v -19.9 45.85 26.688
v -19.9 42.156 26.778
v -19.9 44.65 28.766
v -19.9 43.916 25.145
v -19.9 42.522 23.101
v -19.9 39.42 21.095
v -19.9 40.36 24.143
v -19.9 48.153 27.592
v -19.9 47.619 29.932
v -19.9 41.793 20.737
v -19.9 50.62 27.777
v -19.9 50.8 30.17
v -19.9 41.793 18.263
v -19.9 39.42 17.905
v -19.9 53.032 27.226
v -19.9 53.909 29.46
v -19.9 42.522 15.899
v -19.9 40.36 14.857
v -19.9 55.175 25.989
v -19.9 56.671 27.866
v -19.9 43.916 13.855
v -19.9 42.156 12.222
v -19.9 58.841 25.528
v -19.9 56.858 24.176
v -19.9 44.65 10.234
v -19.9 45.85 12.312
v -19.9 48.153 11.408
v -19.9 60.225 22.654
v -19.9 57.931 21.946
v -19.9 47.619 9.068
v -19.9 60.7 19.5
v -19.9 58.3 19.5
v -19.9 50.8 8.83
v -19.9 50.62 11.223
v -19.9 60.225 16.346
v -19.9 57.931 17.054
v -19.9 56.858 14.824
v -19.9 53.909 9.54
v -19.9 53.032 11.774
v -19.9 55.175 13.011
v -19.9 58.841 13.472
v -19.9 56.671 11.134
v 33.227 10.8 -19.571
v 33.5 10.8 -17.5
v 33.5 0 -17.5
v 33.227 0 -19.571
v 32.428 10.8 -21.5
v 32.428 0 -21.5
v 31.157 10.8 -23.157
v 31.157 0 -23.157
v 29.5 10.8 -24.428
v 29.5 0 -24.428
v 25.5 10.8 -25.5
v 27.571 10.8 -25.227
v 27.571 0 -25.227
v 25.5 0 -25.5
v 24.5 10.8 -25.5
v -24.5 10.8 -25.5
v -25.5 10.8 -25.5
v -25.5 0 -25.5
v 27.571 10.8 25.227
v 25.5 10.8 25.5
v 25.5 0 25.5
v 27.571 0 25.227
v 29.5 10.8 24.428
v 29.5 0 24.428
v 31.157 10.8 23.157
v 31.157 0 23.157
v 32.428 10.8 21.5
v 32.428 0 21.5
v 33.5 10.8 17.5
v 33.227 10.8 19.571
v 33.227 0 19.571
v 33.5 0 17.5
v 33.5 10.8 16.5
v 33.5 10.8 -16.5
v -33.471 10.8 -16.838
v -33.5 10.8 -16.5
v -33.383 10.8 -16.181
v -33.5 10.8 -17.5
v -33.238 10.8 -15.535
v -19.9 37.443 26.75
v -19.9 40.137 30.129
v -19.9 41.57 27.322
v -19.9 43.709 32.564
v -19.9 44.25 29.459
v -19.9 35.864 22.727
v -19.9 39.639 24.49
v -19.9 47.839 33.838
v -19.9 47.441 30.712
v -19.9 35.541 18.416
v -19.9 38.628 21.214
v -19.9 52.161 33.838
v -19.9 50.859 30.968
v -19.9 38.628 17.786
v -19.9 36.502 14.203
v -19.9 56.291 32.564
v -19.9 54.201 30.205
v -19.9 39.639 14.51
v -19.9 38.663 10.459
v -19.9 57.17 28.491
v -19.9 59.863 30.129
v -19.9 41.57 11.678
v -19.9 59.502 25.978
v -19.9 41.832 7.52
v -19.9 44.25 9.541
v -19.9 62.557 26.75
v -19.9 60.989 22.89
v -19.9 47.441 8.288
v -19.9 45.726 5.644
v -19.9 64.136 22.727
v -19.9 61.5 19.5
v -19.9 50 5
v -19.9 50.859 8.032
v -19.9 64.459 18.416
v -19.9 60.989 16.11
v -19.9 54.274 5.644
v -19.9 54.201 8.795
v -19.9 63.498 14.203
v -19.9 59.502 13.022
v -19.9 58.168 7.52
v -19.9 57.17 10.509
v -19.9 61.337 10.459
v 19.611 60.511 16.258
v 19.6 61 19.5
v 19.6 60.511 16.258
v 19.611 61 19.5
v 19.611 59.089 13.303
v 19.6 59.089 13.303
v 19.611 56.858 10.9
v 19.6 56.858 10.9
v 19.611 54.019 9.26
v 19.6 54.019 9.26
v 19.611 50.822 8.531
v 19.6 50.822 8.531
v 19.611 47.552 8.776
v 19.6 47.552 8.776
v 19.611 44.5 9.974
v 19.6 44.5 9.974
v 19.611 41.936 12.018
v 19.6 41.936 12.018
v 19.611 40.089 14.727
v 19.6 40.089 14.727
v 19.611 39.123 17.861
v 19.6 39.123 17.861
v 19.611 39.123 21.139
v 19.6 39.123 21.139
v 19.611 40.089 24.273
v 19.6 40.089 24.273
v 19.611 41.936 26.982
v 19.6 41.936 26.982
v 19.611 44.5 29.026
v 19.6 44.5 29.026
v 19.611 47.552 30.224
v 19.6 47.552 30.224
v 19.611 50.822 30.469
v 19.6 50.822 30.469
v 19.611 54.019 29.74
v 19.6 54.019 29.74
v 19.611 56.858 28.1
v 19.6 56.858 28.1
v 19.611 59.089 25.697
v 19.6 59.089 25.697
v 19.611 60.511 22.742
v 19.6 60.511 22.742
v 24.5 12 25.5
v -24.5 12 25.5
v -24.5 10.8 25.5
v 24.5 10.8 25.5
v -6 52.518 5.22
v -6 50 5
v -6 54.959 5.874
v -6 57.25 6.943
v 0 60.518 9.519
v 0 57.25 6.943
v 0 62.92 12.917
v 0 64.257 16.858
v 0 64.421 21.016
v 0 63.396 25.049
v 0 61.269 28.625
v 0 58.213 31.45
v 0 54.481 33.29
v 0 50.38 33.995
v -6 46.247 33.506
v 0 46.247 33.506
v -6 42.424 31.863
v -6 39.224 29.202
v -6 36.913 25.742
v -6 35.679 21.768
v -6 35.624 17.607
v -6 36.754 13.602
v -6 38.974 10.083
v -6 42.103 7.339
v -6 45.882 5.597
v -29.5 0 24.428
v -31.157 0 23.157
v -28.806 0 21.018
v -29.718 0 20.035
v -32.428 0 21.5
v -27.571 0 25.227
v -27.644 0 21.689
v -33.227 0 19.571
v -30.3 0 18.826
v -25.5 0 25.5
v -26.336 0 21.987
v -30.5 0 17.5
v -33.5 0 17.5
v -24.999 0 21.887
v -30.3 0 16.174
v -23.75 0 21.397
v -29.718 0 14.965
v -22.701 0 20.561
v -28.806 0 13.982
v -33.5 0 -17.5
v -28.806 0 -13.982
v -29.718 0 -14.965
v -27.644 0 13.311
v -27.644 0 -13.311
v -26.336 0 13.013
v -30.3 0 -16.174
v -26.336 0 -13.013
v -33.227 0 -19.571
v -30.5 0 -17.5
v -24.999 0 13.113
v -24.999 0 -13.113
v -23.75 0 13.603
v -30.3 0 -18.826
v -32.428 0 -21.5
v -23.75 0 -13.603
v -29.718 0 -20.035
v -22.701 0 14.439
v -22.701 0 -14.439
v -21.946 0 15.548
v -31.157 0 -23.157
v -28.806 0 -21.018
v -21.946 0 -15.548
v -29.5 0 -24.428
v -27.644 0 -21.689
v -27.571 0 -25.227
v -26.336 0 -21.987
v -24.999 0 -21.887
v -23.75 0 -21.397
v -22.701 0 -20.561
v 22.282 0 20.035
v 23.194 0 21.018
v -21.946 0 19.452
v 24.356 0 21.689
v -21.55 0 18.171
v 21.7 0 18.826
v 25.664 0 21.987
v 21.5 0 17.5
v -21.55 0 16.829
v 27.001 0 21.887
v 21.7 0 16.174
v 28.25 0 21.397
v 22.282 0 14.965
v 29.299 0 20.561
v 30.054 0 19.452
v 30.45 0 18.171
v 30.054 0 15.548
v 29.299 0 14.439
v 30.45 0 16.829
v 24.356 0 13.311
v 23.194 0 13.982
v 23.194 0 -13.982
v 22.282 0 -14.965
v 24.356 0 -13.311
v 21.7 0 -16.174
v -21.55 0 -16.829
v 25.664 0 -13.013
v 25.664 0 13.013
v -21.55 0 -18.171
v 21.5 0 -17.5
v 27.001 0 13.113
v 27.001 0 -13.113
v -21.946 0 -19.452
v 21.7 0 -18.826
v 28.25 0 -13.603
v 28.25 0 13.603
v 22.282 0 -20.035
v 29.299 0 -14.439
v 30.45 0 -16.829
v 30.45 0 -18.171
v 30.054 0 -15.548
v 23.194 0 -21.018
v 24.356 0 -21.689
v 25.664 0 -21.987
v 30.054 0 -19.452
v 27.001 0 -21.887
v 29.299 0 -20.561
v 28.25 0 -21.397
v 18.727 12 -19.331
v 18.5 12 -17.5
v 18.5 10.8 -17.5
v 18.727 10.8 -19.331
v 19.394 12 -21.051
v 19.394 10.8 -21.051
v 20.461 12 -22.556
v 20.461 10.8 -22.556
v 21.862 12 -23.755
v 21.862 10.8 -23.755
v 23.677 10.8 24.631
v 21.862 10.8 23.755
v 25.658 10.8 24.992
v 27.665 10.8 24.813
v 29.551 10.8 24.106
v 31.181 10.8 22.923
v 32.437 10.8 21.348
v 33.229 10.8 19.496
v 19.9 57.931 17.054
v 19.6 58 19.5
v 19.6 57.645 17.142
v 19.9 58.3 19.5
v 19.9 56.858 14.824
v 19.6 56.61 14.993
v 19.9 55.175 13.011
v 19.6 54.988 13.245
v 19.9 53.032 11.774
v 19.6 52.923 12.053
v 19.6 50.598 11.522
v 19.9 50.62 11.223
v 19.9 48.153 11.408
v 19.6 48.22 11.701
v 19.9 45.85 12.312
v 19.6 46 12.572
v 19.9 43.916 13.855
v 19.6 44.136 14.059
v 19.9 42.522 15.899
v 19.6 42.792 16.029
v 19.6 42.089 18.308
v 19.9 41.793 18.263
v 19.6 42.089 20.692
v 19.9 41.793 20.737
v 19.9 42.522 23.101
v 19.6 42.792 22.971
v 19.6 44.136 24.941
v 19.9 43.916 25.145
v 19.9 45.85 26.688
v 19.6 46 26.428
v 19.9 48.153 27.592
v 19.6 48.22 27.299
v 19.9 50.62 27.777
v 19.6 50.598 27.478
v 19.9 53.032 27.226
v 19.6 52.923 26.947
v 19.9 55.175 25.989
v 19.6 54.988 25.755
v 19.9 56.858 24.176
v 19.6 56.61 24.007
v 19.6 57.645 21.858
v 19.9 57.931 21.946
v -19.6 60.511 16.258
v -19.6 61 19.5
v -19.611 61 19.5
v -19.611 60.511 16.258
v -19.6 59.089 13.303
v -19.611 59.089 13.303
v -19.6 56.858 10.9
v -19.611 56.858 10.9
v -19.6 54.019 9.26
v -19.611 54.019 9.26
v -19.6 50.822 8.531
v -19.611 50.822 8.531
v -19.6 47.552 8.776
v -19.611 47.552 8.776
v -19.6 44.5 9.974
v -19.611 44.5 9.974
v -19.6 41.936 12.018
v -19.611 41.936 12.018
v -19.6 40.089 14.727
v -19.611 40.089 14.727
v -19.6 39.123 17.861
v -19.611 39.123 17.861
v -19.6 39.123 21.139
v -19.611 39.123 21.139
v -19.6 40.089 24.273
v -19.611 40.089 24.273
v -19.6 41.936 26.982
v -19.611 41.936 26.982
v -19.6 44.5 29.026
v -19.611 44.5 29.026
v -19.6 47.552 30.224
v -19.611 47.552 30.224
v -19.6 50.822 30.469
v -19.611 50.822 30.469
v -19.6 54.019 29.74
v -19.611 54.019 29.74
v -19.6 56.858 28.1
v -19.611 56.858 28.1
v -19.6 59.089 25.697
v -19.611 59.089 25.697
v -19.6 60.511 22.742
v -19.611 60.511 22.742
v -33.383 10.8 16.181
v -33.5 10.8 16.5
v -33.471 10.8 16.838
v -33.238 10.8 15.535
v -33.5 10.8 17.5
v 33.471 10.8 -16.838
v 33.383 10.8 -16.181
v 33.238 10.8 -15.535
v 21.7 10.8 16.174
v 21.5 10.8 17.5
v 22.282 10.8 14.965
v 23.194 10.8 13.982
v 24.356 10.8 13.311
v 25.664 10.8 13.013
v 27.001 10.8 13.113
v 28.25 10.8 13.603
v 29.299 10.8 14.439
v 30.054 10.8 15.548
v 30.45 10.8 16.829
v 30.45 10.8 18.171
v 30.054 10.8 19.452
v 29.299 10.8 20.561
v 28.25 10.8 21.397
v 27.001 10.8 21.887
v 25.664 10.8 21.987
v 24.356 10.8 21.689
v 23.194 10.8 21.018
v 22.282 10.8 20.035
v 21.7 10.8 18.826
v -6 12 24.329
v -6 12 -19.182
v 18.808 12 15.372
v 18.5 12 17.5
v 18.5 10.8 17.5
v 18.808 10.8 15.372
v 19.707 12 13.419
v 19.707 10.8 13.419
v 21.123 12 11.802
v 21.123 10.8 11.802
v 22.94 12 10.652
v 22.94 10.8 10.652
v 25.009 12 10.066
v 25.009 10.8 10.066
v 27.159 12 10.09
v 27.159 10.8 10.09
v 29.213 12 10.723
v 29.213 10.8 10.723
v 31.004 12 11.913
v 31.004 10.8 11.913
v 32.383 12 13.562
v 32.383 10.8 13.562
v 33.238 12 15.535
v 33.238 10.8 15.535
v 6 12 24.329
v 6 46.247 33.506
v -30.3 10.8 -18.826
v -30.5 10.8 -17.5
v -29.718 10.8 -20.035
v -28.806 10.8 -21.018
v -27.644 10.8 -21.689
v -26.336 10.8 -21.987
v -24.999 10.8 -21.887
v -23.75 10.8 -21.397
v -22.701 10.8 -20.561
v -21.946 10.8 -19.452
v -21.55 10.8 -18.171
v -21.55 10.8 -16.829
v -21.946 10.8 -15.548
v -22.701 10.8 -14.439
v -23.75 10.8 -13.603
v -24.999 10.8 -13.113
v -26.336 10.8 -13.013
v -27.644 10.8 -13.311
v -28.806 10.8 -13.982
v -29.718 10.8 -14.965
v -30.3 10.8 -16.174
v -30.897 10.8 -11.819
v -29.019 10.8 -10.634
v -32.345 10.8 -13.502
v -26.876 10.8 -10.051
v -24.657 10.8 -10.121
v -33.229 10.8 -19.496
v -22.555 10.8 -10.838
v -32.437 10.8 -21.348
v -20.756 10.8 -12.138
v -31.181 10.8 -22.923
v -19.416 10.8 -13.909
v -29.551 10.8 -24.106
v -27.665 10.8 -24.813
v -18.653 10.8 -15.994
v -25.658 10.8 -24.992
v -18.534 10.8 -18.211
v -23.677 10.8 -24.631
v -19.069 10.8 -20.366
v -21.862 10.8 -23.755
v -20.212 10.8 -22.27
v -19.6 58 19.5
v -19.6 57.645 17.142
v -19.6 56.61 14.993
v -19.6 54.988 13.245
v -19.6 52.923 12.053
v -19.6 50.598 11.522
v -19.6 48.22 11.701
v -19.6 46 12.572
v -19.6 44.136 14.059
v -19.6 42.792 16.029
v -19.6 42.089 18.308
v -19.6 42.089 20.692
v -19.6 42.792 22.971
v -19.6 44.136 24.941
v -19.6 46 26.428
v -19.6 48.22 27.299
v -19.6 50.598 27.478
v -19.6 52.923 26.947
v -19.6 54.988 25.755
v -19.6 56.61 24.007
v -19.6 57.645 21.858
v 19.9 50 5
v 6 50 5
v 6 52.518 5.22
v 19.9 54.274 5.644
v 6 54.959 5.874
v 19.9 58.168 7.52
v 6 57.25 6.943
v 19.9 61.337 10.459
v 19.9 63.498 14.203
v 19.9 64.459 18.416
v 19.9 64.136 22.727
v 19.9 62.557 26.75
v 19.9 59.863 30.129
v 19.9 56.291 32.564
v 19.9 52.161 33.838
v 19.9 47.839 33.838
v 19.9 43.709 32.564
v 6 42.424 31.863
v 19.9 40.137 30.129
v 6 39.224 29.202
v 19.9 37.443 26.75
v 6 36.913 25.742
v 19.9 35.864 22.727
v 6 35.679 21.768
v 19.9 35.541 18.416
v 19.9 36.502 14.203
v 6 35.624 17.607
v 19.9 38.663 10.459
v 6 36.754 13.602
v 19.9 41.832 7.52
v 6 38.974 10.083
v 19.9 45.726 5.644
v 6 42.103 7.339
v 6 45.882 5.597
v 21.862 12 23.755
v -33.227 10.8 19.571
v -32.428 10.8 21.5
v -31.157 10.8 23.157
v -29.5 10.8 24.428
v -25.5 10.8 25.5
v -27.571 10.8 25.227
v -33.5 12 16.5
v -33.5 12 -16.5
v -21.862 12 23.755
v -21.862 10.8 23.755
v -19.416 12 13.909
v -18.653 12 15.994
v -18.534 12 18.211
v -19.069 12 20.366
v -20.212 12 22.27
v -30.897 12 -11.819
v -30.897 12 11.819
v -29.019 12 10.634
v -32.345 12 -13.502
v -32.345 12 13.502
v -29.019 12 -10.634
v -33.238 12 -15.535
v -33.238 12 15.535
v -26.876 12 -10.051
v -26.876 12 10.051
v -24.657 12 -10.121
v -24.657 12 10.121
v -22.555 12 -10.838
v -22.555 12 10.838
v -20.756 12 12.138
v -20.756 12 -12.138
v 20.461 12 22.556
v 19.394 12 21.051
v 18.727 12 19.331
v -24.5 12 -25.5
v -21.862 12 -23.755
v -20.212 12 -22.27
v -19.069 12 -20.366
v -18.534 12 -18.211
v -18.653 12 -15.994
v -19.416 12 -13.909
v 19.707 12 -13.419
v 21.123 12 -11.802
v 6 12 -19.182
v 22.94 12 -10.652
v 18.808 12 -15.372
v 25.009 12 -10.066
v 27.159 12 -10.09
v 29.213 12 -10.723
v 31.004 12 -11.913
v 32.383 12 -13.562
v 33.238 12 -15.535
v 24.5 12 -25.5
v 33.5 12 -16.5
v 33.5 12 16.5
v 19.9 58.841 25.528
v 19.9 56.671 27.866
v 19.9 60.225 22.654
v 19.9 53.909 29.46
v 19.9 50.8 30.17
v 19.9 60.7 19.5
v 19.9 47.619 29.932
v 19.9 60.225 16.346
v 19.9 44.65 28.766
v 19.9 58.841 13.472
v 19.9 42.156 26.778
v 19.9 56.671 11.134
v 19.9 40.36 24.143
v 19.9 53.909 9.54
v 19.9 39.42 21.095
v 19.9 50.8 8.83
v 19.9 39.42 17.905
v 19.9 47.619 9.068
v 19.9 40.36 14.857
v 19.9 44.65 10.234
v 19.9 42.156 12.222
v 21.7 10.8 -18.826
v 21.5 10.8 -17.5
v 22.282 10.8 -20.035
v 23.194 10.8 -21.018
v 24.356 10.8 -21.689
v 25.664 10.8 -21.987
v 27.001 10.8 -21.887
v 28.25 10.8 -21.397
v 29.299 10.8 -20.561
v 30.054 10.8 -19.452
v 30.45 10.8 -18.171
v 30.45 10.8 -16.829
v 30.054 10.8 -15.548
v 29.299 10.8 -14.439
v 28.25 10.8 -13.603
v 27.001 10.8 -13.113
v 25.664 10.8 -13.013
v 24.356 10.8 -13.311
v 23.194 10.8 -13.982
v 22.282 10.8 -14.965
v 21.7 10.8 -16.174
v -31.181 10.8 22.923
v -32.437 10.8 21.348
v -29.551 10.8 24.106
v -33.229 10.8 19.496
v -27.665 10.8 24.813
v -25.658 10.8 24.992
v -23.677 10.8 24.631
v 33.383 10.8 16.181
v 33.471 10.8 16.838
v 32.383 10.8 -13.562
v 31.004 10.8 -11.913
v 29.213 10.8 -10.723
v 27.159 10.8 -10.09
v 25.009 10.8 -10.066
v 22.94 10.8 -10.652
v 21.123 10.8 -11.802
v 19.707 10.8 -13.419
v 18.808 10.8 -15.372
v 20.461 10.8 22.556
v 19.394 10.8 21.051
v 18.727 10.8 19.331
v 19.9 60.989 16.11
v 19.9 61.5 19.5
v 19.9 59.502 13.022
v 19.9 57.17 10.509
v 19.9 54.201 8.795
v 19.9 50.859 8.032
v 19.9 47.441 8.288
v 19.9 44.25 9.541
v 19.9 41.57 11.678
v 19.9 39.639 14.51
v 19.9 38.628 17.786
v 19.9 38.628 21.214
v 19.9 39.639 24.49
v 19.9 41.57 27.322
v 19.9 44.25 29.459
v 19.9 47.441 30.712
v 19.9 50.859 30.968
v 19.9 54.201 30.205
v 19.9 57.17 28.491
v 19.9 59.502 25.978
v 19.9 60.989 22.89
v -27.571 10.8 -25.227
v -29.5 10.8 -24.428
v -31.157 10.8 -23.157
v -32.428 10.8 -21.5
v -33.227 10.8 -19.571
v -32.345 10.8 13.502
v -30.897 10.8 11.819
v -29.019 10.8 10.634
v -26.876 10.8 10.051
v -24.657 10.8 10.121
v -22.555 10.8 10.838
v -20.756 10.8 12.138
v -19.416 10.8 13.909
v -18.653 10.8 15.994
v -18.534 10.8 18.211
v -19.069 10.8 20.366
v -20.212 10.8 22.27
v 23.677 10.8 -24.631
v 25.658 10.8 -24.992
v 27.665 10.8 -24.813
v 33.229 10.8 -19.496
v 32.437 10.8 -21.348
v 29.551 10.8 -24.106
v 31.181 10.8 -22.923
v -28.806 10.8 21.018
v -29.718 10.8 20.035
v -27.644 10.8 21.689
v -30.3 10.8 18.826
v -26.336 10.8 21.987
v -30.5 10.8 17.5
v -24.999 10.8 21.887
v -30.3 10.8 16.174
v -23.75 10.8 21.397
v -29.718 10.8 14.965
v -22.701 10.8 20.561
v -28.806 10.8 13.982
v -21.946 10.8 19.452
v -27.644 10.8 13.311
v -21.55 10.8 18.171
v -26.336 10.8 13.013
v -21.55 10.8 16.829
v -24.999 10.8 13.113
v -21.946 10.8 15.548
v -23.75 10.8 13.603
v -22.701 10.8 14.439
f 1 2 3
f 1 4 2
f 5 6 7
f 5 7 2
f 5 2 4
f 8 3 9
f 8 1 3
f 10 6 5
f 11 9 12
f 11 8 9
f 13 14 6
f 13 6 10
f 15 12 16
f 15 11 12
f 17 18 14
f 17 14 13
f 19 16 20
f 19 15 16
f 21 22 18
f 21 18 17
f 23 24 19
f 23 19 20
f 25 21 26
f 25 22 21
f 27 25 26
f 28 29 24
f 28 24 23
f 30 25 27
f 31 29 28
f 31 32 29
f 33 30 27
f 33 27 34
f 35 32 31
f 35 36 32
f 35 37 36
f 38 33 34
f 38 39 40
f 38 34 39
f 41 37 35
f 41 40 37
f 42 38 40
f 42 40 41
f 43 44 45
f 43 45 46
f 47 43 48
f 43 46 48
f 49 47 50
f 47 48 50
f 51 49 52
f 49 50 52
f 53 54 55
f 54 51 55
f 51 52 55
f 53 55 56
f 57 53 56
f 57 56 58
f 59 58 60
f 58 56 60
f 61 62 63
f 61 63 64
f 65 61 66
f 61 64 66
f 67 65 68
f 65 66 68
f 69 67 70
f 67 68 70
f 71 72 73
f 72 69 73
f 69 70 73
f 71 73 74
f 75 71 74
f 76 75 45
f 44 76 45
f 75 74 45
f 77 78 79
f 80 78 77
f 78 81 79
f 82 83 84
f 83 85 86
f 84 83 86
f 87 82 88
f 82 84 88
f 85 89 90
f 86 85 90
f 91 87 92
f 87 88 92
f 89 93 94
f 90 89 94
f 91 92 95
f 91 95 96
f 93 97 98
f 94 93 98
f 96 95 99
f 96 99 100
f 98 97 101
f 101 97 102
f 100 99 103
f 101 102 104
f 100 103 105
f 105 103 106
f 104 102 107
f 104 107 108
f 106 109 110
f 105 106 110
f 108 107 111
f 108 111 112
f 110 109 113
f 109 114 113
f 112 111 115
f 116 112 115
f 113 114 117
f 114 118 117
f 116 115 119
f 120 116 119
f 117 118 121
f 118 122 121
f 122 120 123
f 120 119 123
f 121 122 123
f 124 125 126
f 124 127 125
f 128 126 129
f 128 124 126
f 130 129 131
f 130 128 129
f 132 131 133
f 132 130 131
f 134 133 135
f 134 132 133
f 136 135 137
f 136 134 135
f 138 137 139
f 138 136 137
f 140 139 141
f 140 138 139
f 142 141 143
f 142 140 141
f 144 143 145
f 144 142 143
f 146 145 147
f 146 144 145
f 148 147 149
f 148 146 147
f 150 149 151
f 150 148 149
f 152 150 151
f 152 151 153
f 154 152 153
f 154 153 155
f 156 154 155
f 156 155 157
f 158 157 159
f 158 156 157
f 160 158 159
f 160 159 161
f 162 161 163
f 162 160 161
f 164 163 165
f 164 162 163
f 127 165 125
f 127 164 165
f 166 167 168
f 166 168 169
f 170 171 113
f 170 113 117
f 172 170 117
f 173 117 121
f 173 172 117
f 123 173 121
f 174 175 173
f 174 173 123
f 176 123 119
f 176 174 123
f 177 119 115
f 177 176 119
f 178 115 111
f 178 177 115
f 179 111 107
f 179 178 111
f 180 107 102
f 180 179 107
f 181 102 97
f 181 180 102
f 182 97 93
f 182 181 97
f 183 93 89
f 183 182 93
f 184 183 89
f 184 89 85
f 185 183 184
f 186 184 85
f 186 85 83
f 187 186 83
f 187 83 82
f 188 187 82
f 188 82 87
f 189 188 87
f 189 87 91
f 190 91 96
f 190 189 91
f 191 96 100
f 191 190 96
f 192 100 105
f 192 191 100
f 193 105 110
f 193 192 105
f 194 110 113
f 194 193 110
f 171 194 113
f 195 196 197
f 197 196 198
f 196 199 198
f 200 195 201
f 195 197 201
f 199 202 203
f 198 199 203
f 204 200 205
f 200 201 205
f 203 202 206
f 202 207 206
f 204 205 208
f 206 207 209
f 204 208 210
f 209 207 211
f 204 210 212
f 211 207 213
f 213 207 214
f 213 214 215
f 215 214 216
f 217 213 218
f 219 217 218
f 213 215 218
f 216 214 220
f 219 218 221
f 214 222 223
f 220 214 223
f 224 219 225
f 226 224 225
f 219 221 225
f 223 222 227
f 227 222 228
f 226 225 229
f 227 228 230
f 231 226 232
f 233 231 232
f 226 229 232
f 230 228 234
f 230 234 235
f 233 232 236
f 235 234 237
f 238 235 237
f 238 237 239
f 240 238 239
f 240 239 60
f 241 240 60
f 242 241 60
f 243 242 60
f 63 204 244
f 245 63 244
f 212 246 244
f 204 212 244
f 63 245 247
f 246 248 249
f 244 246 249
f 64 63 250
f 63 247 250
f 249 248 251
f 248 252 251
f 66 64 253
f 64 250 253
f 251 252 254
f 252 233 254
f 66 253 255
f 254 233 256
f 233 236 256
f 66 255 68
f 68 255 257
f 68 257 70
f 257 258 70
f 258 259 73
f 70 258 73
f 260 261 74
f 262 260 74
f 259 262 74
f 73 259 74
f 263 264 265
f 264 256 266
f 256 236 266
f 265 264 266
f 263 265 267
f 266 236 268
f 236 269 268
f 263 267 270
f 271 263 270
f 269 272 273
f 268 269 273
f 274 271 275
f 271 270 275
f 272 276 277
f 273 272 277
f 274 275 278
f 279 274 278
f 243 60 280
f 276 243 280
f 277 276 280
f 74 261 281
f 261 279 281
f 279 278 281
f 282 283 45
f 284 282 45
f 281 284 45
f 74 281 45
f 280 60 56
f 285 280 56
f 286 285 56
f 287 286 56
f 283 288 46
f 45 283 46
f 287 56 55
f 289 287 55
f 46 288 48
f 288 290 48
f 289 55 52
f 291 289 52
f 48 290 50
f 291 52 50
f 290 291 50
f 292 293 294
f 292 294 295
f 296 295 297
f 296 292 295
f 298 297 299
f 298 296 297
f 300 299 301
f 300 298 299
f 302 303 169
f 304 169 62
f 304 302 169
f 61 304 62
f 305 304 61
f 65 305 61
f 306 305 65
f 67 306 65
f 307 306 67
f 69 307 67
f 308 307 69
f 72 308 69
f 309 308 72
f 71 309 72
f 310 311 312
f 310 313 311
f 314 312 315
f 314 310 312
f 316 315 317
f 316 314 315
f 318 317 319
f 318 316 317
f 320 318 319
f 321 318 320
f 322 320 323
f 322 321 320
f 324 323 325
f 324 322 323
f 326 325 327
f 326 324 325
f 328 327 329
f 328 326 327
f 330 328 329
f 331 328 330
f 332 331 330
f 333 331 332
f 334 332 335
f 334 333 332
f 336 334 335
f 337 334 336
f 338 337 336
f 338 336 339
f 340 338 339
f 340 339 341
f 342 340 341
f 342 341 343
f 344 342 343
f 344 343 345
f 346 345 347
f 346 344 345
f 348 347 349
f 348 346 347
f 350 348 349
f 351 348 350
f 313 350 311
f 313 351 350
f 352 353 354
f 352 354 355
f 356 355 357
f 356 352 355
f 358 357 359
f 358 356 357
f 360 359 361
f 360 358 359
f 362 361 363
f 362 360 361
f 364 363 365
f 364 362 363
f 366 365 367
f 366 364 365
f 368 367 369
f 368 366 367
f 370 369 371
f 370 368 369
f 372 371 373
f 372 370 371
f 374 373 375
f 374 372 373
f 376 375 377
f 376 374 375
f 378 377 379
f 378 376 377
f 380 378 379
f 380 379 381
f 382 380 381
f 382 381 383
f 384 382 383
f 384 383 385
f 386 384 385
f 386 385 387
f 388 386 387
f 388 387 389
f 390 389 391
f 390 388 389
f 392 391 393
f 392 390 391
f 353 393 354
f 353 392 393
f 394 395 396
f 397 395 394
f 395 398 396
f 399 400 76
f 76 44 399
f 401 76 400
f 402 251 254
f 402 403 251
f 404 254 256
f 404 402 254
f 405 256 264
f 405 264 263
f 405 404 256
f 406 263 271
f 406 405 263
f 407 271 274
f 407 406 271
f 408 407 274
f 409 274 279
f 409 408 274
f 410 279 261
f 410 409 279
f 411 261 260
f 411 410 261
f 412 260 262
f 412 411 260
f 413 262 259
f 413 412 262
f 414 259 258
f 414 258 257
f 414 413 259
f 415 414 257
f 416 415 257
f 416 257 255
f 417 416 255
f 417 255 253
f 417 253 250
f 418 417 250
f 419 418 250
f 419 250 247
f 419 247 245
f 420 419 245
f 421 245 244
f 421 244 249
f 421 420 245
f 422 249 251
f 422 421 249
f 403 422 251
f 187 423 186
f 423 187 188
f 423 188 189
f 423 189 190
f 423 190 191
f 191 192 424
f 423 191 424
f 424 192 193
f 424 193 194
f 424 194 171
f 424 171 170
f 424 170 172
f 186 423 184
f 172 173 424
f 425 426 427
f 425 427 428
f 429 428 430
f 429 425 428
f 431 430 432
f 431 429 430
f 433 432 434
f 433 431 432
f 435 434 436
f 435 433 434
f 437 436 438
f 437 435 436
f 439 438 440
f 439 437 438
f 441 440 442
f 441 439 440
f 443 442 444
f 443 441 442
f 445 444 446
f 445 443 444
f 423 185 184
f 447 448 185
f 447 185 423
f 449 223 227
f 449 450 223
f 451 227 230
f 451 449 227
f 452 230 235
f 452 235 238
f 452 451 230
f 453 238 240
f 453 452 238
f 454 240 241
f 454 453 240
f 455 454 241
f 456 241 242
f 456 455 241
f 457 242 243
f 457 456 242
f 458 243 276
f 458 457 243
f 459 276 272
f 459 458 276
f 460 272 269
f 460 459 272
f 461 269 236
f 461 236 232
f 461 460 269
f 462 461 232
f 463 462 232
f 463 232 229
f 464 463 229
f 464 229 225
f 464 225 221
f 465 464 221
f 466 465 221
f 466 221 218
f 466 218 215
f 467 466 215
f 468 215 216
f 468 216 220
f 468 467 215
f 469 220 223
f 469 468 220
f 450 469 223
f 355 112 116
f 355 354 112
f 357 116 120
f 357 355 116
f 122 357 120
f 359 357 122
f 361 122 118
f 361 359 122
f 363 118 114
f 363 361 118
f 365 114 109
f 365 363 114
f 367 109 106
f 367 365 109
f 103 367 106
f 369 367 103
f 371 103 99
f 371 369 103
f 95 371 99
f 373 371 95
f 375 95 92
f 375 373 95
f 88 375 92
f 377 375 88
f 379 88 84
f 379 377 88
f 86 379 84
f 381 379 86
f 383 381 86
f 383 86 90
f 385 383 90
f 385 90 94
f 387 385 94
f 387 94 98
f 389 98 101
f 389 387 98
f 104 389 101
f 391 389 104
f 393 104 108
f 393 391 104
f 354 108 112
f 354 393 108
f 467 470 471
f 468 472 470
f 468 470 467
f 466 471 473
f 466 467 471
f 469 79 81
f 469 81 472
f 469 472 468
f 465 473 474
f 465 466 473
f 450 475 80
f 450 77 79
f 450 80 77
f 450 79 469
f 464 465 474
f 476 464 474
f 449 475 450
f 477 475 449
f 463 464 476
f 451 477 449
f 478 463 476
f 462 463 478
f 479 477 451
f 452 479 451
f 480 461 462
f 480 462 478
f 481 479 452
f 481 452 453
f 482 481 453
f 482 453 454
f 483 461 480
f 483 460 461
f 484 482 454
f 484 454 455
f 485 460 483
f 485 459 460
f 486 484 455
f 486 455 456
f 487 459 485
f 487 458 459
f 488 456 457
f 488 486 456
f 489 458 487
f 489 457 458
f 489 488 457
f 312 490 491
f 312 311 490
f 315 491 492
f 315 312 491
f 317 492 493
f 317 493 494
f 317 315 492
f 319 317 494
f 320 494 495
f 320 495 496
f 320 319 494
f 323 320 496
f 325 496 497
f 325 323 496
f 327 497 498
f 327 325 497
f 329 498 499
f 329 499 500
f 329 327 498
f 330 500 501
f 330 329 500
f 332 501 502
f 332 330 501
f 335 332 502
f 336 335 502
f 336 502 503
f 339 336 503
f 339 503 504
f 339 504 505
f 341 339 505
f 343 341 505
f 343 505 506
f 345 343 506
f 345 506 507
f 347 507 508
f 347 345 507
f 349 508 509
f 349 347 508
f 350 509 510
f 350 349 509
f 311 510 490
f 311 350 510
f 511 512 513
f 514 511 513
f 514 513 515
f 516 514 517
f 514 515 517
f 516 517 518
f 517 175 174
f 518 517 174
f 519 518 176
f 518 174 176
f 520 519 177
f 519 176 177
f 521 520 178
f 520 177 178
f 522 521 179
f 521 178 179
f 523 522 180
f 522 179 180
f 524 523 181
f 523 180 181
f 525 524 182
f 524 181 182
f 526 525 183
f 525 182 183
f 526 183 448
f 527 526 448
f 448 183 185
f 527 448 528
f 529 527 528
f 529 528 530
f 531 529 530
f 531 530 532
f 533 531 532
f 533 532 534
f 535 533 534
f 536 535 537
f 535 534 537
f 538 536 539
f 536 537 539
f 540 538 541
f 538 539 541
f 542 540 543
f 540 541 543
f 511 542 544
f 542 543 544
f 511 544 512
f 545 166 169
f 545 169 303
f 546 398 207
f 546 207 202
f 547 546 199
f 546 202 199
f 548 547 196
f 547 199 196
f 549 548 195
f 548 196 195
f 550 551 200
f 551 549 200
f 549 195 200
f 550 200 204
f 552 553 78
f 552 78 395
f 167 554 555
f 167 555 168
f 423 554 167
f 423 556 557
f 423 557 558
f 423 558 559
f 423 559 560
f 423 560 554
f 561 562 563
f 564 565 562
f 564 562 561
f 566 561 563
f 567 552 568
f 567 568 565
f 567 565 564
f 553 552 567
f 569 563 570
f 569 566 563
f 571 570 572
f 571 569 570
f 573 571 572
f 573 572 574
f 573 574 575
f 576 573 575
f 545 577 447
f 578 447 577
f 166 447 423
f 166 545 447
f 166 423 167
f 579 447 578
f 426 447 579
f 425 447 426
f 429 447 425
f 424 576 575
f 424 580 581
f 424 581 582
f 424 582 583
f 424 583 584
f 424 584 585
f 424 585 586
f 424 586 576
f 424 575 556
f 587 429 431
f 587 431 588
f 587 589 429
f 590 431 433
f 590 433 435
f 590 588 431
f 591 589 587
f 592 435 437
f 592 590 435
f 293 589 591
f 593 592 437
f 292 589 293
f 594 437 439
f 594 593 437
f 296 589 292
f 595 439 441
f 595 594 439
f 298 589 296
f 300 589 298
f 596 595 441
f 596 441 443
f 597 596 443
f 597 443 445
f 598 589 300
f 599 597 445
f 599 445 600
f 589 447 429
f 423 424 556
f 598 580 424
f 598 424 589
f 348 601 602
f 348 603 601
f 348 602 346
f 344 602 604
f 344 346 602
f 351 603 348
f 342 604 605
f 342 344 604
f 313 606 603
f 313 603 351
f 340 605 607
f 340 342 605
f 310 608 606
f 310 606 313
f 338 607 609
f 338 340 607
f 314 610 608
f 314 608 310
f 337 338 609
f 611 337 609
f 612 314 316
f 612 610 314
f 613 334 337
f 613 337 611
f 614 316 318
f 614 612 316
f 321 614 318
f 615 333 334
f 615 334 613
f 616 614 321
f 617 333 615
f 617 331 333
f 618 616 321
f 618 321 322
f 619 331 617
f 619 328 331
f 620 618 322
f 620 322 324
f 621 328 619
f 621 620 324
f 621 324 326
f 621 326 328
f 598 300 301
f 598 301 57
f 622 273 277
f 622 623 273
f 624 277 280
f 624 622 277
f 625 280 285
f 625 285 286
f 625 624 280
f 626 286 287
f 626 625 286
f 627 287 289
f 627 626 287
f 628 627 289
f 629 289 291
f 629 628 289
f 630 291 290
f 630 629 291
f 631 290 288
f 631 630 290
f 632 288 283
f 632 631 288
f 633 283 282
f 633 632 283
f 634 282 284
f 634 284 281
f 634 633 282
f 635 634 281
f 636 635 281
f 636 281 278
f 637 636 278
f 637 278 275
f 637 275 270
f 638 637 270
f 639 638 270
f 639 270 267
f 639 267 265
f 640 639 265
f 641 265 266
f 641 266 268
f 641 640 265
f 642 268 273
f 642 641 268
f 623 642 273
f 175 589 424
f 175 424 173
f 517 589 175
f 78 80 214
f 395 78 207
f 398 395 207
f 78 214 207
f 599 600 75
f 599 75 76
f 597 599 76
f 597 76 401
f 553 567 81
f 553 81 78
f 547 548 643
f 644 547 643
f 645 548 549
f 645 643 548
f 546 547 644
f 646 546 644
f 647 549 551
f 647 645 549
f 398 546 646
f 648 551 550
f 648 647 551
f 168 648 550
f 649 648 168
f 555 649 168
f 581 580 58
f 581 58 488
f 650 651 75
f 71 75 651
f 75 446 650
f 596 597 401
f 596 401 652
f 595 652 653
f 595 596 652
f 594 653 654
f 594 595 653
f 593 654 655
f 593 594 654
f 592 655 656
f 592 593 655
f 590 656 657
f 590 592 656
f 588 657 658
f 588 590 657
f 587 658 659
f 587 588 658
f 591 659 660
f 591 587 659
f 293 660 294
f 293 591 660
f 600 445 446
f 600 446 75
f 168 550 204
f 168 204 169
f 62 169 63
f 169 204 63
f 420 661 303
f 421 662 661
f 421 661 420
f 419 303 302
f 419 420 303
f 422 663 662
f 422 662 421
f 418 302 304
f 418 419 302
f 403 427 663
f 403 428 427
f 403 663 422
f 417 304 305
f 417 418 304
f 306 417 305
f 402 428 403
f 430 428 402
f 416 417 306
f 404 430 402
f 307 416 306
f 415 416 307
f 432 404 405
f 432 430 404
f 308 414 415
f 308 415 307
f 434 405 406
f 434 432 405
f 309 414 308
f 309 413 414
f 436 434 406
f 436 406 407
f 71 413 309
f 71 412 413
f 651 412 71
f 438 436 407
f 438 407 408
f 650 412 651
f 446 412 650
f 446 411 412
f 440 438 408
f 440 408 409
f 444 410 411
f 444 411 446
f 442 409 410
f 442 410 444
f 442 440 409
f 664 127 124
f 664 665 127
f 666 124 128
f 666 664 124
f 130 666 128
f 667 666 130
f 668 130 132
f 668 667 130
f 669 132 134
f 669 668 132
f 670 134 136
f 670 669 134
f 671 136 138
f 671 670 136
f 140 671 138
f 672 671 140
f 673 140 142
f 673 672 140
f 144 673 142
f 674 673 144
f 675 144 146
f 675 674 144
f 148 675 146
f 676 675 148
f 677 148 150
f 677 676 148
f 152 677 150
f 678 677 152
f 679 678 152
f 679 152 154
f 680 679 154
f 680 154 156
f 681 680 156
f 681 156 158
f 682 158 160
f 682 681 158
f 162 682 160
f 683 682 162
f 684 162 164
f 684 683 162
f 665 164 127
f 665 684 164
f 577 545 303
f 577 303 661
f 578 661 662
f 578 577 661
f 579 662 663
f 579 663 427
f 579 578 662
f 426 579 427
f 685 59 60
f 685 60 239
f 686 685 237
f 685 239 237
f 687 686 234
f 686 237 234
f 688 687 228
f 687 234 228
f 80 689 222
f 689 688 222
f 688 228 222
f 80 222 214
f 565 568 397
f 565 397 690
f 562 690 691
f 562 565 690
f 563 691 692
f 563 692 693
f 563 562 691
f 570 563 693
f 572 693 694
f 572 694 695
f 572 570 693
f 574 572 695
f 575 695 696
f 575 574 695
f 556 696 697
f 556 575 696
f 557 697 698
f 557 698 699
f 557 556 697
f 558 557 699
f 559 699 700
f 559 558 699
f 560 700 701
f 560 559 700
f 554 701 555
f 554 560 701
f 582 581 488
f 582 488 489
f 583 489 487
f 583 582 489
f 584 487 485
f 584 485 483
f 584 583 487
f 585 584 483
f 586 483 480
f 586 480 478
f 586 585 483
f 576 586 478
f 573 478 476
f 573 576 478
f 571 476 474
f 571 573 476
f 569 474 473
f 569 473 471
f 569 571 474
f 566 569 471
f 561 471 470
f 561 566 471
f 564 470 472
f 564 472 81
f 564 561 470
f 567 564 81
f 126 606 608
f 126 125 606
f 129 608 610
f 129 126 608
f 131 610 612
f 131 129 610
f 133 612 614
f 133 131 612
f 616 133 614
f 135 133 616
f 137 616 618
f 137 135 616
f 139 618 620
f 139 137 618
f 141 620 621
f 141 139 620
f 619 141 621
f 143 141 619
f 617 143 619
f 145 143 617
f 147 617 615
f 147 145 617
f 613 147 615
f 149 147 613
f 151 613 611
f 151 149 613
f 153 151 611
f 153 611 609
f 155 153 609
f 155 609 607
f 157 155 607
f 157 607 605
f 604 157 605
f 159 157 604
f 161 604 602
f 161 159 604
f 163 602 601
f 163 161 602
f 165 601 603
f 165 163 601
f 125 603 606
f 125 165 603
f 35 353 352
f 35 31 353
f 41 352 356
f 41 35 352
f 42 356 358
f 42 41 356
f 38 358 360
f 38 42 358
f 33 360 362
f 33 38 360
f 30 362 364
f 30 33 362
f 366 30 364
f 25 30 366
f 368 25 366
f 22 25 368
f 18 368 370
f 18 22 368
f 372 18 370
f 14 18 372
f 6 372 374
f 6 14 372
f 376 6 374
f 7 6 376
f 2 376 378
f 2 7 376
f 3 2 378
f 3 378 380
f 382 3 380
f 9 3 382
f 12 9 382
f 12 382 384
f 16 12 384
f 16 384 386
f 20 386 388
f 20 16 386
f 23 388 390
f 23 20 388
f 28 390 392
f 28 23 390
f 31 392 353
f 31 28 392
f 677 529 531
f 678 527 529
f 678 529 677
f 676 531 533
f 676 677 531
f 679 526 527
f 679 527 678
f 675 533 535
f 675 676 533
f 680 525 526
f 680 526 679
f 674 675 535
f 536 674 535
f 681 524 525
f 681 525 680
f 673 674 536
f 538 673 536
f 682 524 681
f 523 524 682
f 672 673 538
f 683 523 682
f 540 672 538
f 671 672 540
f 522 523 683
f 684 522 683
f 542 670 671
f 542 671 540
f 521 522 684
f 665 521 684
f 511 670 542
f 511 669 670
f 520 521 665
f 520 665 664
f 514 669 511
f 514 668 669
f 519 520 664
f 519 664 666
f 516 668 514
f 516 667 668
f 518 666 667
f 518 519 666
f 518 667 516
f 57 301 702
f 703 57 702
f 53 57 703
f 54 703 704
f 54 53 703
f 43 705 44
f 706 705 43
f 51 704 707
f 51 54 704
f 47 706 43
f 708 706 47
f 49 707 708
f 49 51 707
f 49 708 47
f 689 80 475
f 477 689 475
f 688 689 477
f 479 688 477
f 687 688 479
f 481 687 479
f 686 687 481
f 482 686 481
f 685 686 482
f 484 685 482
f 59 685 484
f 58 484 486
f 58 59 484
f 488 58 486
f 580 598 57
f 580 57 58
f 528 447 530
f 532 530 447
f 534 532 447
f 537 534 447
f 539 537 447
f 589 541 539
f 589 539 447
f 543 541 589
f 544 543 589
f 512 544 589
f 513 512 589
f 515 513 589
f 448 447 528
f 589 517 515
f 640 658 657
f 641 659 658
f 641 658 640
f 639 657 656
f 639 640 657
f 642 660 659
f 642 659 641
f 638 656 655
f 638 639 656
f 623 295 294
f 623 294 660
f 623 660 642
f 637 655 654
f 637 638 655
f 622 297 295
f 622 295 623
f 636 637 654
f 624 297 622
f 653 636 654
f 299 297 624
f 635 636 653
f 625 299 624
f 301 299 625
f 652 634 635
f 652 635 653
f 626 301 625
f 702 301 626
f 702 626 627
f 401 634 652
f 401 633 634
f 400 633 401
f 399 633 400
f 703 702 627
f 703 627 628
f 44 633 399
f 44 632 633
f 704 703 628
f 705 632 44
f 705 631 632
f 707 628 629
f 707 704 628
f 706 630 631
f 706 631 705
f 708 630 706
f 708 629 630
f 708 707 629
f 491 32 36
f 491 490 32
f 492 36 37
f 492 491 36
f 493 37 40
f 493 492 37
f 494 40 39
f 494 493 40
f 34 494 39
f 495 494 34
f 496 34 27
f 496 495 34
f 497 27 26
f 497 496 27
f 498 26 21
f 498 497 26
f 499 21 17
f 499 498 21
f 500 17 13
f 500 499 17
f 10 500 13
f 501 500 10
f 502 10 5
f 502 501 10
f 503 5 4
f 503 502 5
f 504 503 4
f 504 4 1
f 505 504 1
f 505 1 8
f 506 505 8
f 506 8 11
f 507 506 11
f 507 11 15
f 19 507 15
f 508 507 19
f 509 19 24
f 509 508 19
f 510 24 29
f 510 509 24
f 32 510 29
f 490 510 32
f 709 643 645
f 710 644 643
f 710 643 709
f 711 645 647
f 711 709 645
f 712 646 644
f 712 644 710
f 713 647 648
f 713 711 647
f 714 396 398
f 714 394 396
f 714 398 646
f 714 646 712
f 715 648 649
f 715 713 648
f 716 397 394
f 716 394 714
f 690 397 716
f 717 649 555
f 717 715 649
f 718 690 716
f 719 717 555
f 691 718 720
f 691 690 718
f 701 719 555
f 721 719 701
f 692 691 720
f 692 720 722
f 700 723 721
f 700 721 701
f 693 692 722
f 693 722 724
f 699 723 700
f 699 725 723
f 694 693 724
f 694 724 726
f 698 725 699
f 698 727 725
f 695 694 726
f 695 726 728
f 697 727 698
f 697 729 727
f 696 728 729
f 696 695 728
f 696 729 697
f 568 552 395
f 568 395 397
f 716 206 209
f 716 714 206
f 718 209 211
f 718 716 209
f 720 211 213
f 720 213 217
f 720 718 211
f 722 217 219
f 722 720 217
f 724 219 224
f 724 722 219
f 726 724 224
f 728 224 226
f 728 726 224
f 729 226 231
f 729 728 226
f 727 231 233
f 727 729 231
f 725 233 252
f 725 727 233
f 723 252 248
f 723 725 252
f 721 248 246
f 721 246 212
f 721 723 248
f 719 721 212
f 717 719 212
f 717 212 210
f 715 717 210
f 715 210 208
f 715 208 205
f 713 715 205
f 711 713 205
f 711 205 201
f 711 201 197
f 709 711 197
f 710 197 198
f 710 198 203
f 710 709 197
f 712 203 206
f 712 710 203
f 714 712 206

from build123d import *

# Parameters (mm, degrees)
BOSS_EXTRUDE1_DEPTH      = 12
BOSS_EXTRUDE2_DEPTH      = 6
BOSS_EXTRUDE2_DEPTH_BACK = 6
SKETCH3_R                = 14.5
BOSS_EXTRUDE3_DEPTH      = 19.9
BOSS_EXTRUDE3_DEPTH_BACK = 19.9
SKETCH4_W                = 134
SKETCH4_H                = 102
CUT_EXTRUDE1_DEPTH       = 1.2


with BuildPart() as part:
    # Sketch1 → Boss-Extrude1 (new body)
    with BuildSketch(Plane(origin=(0, 0, 0), x_dir=(1, 0, 0), z_dir=(0, 1, 0))):
        with BuildLine():
            Line((-25.5, -25.5), (25.5, -25.5))
            ThreePointArc((25.5, -25.5), (31.156854249, -23.156854249), (33.5, -17.5))
            Line((33.5, -17.5), (33.5, 17.5))
            ThreePointArc((33.5, 17.5), (31.156854249, 23.156854249), (25.5, 25.5))
            Line((25.5, 25.5), (-25.5, 25.5))
            ThreePointArc((-25.5, 25.5), (-31.156854249, 23.156854249), (-33.5, 17.5))
            Line((-33.5, 17.5), (-33.5, -17.5))
            ThreePointArc((-33.5, -17.5), (-31.156854249, -23.156854249), (-25.5, -25.5))
        make_face()
    extrude(amount=BOSS_EXTRUDE1_DEPTH)

    # Sketch2 → Boss-Extrude2 (add, two sides)
    with BuildSketch(Plane(origin=(0, 0, 0), x_dir=(0, 0, -1), z_dir=(1, 0, 0))) as boss_extrude2_sk:
        Polygon((-33.505924481, 46.247123846), (-24.329435304, 12), (19.182468036, 12), (-6.942631645, 57.25), align=None)
    extrude(amount=BOSS_EXTRUDE2_DEPTH)
    extrude(boss_extrude2_sk.sketch, amount=-BOSS_EXTRUDE2_DEPTH_BACK)

    # Sketch3 → Boss-Extrude3 (add, two sides)
    with BuildSketch(Plane(origin=(0, 0, 0), x_dir=(0, 0, -1), z_dir=(1, 0, 0))) as boss_extrude3_sk:
        with Locations((-19.5, 50)):
            Circle(SKETCH3_R)
    extrude(amount=BOSS_EXTRUDE3_DEPTH)
    extrude(boss_extrude3_sk.sketch, amount=-BOSS_EXTRUDE3_DEPTH_BACK)

    # Sketch4 → Cut-Extrude1 (cut)
    with BuildSketch(Plane(origin=(0, 12, 0), x_dir=(1, 0, 0), z_dir=(0, 1, 0))):
        Rectangle(SKETCH4_W, SKETCH4_H)
        with BuildLine():
            Line((-33.5, 16.5), (-33.5, -16.5))
            Line((-33.5, -16.5), (-33.237991266, -15.534934498))
            ThreePointArc((-33.237991266, -15.534934498), (-21.607110594, -11.421141335), (-21.862465515, -23.755462284))
            Line((-21.862465515, -23.755462284), (-24.5, -25.5))
            Line((-24.5, -25.5), (24.5, -25.5))
            Line((24.5, -25.5), (21.862465515, -23.755462284))
            ThreePointArc((21.862465515, -23.755462284), (21.607110594, -11.421141335), (33.237991266, -15.534934498))
            Line((33.237991266, -15.534934498), (33.5, -16.5))
            Line((33.5, -16.5), (33.5, 16.5))
            Line((33.5, 16.5), (33.237991266, 15.534934498))
            ThreePointArc((33.237991266, 15.534934498), (21.607110594, 11.421141335), (21.862465515, 23.755462284))
            Line((21.862465515, 23.755462284), (24.5, 25.5))
            Line((24.5, 25.5), (-24.5, 25.5))
            Line((-24.5, 25.5), (-21.862465515, 23.755462284))
            ThreePointArc((-21.862465515, 23.755462284), (-21.607110594, 11.421141335), (-33.237991266, 15.534934498))
            Line((-33.237991266, 15.534934498), (-33.5, 16.5))
        make_face(mode=Mode.SUBTRACT)
    extrude(amount=-CUT_EXTRUDE1_DEPTH, mode=Mode.SUBTRACT)

    # Sketch5 → Cut-Revolve1 (revolve, cut)
    with BuildSketch(Plane.XY.offset(17.5)):
        Polygon((-26, 0), (-30.5, 0), (-30.5, 10.8), (-33.5, 10.8), (-33.5, 12), (-26, 12), align=None)
    revolve(axis=Axis((-26, 12, 17.5), (0, -1, 0)), mode=Mode.SUBTRACT)

    # Sketch6 → Cut-Revolve2 (revolve, cut)
    with BuildSketch(Plane.XY.offset(-17.5)):
        Polygon((-26, 0), (-30.5, 0), (-30.5, 10.8), (-33.5, 10.8), (-33.5, 12), (-26, 12), align=None)
    revolve(axis=Axis((-26, 12, -17.5), (0, -1, 0)), mode=Mode.SUBTRACT)

    # Sketch7 → Cut-Revolve3 (revolve, cut)
    with BuildSketch(Plane.XY.offset(17.5)):
        Polygon((26, 0), (21.5, 0), (21.5, 10.8), (18.5, 10.8), (18.5, 12), (26, 12), align=None)
    revolve(axis=Axis((26, 12, 17.5), (0, -1, 0)), mode=Mode.SUBTRACT)

    # Sketch8 → Cut-Revolve4 (revolve, cut)
    with BuildSketch(Plane.XY.offset(-17.5)):
        Polygon((26, 0), (21.5, 0), (21.5, 10.8), (18.5, 10.8), (18.5, 12), (26, 12), align=None)
    revolve(axis=Axis((26, 12, -17.5), (0, -1, 0)), mode=Mode.SUBTRACT)

    # Sketch9 → Cut-Revolve5 (revolve, cut)
    with BuildSketch(Plane.XY.offset(19.5)):
        Polygon((-19.9, 50), (-19.9, 61.5), (-19.611324865, 61), (19.611324865, 61), (19.9, 61.5), (19.9, 50), align=None)
    revolve(axis=Axis((19.9, 50, 19.5), (-1, 0, 0)), mode=Mode.SUBTRACT)

    # Sketch10 → Revolve1 (revolve)
    with BuildSketch(Plane.XY.offset(19.5)):
        Polygon((-19.9, 58.3), (-19.6, 58), (19.6, 58), (19.9, 58.3), (19.9, 60.7), (19.6, 61), (-19.6, 61), (-19.9, 60.7), align=None)
    revolve(axis=Axis((19.9, 50, 19.5), (-1, 0, 0)))


solid = part.part
